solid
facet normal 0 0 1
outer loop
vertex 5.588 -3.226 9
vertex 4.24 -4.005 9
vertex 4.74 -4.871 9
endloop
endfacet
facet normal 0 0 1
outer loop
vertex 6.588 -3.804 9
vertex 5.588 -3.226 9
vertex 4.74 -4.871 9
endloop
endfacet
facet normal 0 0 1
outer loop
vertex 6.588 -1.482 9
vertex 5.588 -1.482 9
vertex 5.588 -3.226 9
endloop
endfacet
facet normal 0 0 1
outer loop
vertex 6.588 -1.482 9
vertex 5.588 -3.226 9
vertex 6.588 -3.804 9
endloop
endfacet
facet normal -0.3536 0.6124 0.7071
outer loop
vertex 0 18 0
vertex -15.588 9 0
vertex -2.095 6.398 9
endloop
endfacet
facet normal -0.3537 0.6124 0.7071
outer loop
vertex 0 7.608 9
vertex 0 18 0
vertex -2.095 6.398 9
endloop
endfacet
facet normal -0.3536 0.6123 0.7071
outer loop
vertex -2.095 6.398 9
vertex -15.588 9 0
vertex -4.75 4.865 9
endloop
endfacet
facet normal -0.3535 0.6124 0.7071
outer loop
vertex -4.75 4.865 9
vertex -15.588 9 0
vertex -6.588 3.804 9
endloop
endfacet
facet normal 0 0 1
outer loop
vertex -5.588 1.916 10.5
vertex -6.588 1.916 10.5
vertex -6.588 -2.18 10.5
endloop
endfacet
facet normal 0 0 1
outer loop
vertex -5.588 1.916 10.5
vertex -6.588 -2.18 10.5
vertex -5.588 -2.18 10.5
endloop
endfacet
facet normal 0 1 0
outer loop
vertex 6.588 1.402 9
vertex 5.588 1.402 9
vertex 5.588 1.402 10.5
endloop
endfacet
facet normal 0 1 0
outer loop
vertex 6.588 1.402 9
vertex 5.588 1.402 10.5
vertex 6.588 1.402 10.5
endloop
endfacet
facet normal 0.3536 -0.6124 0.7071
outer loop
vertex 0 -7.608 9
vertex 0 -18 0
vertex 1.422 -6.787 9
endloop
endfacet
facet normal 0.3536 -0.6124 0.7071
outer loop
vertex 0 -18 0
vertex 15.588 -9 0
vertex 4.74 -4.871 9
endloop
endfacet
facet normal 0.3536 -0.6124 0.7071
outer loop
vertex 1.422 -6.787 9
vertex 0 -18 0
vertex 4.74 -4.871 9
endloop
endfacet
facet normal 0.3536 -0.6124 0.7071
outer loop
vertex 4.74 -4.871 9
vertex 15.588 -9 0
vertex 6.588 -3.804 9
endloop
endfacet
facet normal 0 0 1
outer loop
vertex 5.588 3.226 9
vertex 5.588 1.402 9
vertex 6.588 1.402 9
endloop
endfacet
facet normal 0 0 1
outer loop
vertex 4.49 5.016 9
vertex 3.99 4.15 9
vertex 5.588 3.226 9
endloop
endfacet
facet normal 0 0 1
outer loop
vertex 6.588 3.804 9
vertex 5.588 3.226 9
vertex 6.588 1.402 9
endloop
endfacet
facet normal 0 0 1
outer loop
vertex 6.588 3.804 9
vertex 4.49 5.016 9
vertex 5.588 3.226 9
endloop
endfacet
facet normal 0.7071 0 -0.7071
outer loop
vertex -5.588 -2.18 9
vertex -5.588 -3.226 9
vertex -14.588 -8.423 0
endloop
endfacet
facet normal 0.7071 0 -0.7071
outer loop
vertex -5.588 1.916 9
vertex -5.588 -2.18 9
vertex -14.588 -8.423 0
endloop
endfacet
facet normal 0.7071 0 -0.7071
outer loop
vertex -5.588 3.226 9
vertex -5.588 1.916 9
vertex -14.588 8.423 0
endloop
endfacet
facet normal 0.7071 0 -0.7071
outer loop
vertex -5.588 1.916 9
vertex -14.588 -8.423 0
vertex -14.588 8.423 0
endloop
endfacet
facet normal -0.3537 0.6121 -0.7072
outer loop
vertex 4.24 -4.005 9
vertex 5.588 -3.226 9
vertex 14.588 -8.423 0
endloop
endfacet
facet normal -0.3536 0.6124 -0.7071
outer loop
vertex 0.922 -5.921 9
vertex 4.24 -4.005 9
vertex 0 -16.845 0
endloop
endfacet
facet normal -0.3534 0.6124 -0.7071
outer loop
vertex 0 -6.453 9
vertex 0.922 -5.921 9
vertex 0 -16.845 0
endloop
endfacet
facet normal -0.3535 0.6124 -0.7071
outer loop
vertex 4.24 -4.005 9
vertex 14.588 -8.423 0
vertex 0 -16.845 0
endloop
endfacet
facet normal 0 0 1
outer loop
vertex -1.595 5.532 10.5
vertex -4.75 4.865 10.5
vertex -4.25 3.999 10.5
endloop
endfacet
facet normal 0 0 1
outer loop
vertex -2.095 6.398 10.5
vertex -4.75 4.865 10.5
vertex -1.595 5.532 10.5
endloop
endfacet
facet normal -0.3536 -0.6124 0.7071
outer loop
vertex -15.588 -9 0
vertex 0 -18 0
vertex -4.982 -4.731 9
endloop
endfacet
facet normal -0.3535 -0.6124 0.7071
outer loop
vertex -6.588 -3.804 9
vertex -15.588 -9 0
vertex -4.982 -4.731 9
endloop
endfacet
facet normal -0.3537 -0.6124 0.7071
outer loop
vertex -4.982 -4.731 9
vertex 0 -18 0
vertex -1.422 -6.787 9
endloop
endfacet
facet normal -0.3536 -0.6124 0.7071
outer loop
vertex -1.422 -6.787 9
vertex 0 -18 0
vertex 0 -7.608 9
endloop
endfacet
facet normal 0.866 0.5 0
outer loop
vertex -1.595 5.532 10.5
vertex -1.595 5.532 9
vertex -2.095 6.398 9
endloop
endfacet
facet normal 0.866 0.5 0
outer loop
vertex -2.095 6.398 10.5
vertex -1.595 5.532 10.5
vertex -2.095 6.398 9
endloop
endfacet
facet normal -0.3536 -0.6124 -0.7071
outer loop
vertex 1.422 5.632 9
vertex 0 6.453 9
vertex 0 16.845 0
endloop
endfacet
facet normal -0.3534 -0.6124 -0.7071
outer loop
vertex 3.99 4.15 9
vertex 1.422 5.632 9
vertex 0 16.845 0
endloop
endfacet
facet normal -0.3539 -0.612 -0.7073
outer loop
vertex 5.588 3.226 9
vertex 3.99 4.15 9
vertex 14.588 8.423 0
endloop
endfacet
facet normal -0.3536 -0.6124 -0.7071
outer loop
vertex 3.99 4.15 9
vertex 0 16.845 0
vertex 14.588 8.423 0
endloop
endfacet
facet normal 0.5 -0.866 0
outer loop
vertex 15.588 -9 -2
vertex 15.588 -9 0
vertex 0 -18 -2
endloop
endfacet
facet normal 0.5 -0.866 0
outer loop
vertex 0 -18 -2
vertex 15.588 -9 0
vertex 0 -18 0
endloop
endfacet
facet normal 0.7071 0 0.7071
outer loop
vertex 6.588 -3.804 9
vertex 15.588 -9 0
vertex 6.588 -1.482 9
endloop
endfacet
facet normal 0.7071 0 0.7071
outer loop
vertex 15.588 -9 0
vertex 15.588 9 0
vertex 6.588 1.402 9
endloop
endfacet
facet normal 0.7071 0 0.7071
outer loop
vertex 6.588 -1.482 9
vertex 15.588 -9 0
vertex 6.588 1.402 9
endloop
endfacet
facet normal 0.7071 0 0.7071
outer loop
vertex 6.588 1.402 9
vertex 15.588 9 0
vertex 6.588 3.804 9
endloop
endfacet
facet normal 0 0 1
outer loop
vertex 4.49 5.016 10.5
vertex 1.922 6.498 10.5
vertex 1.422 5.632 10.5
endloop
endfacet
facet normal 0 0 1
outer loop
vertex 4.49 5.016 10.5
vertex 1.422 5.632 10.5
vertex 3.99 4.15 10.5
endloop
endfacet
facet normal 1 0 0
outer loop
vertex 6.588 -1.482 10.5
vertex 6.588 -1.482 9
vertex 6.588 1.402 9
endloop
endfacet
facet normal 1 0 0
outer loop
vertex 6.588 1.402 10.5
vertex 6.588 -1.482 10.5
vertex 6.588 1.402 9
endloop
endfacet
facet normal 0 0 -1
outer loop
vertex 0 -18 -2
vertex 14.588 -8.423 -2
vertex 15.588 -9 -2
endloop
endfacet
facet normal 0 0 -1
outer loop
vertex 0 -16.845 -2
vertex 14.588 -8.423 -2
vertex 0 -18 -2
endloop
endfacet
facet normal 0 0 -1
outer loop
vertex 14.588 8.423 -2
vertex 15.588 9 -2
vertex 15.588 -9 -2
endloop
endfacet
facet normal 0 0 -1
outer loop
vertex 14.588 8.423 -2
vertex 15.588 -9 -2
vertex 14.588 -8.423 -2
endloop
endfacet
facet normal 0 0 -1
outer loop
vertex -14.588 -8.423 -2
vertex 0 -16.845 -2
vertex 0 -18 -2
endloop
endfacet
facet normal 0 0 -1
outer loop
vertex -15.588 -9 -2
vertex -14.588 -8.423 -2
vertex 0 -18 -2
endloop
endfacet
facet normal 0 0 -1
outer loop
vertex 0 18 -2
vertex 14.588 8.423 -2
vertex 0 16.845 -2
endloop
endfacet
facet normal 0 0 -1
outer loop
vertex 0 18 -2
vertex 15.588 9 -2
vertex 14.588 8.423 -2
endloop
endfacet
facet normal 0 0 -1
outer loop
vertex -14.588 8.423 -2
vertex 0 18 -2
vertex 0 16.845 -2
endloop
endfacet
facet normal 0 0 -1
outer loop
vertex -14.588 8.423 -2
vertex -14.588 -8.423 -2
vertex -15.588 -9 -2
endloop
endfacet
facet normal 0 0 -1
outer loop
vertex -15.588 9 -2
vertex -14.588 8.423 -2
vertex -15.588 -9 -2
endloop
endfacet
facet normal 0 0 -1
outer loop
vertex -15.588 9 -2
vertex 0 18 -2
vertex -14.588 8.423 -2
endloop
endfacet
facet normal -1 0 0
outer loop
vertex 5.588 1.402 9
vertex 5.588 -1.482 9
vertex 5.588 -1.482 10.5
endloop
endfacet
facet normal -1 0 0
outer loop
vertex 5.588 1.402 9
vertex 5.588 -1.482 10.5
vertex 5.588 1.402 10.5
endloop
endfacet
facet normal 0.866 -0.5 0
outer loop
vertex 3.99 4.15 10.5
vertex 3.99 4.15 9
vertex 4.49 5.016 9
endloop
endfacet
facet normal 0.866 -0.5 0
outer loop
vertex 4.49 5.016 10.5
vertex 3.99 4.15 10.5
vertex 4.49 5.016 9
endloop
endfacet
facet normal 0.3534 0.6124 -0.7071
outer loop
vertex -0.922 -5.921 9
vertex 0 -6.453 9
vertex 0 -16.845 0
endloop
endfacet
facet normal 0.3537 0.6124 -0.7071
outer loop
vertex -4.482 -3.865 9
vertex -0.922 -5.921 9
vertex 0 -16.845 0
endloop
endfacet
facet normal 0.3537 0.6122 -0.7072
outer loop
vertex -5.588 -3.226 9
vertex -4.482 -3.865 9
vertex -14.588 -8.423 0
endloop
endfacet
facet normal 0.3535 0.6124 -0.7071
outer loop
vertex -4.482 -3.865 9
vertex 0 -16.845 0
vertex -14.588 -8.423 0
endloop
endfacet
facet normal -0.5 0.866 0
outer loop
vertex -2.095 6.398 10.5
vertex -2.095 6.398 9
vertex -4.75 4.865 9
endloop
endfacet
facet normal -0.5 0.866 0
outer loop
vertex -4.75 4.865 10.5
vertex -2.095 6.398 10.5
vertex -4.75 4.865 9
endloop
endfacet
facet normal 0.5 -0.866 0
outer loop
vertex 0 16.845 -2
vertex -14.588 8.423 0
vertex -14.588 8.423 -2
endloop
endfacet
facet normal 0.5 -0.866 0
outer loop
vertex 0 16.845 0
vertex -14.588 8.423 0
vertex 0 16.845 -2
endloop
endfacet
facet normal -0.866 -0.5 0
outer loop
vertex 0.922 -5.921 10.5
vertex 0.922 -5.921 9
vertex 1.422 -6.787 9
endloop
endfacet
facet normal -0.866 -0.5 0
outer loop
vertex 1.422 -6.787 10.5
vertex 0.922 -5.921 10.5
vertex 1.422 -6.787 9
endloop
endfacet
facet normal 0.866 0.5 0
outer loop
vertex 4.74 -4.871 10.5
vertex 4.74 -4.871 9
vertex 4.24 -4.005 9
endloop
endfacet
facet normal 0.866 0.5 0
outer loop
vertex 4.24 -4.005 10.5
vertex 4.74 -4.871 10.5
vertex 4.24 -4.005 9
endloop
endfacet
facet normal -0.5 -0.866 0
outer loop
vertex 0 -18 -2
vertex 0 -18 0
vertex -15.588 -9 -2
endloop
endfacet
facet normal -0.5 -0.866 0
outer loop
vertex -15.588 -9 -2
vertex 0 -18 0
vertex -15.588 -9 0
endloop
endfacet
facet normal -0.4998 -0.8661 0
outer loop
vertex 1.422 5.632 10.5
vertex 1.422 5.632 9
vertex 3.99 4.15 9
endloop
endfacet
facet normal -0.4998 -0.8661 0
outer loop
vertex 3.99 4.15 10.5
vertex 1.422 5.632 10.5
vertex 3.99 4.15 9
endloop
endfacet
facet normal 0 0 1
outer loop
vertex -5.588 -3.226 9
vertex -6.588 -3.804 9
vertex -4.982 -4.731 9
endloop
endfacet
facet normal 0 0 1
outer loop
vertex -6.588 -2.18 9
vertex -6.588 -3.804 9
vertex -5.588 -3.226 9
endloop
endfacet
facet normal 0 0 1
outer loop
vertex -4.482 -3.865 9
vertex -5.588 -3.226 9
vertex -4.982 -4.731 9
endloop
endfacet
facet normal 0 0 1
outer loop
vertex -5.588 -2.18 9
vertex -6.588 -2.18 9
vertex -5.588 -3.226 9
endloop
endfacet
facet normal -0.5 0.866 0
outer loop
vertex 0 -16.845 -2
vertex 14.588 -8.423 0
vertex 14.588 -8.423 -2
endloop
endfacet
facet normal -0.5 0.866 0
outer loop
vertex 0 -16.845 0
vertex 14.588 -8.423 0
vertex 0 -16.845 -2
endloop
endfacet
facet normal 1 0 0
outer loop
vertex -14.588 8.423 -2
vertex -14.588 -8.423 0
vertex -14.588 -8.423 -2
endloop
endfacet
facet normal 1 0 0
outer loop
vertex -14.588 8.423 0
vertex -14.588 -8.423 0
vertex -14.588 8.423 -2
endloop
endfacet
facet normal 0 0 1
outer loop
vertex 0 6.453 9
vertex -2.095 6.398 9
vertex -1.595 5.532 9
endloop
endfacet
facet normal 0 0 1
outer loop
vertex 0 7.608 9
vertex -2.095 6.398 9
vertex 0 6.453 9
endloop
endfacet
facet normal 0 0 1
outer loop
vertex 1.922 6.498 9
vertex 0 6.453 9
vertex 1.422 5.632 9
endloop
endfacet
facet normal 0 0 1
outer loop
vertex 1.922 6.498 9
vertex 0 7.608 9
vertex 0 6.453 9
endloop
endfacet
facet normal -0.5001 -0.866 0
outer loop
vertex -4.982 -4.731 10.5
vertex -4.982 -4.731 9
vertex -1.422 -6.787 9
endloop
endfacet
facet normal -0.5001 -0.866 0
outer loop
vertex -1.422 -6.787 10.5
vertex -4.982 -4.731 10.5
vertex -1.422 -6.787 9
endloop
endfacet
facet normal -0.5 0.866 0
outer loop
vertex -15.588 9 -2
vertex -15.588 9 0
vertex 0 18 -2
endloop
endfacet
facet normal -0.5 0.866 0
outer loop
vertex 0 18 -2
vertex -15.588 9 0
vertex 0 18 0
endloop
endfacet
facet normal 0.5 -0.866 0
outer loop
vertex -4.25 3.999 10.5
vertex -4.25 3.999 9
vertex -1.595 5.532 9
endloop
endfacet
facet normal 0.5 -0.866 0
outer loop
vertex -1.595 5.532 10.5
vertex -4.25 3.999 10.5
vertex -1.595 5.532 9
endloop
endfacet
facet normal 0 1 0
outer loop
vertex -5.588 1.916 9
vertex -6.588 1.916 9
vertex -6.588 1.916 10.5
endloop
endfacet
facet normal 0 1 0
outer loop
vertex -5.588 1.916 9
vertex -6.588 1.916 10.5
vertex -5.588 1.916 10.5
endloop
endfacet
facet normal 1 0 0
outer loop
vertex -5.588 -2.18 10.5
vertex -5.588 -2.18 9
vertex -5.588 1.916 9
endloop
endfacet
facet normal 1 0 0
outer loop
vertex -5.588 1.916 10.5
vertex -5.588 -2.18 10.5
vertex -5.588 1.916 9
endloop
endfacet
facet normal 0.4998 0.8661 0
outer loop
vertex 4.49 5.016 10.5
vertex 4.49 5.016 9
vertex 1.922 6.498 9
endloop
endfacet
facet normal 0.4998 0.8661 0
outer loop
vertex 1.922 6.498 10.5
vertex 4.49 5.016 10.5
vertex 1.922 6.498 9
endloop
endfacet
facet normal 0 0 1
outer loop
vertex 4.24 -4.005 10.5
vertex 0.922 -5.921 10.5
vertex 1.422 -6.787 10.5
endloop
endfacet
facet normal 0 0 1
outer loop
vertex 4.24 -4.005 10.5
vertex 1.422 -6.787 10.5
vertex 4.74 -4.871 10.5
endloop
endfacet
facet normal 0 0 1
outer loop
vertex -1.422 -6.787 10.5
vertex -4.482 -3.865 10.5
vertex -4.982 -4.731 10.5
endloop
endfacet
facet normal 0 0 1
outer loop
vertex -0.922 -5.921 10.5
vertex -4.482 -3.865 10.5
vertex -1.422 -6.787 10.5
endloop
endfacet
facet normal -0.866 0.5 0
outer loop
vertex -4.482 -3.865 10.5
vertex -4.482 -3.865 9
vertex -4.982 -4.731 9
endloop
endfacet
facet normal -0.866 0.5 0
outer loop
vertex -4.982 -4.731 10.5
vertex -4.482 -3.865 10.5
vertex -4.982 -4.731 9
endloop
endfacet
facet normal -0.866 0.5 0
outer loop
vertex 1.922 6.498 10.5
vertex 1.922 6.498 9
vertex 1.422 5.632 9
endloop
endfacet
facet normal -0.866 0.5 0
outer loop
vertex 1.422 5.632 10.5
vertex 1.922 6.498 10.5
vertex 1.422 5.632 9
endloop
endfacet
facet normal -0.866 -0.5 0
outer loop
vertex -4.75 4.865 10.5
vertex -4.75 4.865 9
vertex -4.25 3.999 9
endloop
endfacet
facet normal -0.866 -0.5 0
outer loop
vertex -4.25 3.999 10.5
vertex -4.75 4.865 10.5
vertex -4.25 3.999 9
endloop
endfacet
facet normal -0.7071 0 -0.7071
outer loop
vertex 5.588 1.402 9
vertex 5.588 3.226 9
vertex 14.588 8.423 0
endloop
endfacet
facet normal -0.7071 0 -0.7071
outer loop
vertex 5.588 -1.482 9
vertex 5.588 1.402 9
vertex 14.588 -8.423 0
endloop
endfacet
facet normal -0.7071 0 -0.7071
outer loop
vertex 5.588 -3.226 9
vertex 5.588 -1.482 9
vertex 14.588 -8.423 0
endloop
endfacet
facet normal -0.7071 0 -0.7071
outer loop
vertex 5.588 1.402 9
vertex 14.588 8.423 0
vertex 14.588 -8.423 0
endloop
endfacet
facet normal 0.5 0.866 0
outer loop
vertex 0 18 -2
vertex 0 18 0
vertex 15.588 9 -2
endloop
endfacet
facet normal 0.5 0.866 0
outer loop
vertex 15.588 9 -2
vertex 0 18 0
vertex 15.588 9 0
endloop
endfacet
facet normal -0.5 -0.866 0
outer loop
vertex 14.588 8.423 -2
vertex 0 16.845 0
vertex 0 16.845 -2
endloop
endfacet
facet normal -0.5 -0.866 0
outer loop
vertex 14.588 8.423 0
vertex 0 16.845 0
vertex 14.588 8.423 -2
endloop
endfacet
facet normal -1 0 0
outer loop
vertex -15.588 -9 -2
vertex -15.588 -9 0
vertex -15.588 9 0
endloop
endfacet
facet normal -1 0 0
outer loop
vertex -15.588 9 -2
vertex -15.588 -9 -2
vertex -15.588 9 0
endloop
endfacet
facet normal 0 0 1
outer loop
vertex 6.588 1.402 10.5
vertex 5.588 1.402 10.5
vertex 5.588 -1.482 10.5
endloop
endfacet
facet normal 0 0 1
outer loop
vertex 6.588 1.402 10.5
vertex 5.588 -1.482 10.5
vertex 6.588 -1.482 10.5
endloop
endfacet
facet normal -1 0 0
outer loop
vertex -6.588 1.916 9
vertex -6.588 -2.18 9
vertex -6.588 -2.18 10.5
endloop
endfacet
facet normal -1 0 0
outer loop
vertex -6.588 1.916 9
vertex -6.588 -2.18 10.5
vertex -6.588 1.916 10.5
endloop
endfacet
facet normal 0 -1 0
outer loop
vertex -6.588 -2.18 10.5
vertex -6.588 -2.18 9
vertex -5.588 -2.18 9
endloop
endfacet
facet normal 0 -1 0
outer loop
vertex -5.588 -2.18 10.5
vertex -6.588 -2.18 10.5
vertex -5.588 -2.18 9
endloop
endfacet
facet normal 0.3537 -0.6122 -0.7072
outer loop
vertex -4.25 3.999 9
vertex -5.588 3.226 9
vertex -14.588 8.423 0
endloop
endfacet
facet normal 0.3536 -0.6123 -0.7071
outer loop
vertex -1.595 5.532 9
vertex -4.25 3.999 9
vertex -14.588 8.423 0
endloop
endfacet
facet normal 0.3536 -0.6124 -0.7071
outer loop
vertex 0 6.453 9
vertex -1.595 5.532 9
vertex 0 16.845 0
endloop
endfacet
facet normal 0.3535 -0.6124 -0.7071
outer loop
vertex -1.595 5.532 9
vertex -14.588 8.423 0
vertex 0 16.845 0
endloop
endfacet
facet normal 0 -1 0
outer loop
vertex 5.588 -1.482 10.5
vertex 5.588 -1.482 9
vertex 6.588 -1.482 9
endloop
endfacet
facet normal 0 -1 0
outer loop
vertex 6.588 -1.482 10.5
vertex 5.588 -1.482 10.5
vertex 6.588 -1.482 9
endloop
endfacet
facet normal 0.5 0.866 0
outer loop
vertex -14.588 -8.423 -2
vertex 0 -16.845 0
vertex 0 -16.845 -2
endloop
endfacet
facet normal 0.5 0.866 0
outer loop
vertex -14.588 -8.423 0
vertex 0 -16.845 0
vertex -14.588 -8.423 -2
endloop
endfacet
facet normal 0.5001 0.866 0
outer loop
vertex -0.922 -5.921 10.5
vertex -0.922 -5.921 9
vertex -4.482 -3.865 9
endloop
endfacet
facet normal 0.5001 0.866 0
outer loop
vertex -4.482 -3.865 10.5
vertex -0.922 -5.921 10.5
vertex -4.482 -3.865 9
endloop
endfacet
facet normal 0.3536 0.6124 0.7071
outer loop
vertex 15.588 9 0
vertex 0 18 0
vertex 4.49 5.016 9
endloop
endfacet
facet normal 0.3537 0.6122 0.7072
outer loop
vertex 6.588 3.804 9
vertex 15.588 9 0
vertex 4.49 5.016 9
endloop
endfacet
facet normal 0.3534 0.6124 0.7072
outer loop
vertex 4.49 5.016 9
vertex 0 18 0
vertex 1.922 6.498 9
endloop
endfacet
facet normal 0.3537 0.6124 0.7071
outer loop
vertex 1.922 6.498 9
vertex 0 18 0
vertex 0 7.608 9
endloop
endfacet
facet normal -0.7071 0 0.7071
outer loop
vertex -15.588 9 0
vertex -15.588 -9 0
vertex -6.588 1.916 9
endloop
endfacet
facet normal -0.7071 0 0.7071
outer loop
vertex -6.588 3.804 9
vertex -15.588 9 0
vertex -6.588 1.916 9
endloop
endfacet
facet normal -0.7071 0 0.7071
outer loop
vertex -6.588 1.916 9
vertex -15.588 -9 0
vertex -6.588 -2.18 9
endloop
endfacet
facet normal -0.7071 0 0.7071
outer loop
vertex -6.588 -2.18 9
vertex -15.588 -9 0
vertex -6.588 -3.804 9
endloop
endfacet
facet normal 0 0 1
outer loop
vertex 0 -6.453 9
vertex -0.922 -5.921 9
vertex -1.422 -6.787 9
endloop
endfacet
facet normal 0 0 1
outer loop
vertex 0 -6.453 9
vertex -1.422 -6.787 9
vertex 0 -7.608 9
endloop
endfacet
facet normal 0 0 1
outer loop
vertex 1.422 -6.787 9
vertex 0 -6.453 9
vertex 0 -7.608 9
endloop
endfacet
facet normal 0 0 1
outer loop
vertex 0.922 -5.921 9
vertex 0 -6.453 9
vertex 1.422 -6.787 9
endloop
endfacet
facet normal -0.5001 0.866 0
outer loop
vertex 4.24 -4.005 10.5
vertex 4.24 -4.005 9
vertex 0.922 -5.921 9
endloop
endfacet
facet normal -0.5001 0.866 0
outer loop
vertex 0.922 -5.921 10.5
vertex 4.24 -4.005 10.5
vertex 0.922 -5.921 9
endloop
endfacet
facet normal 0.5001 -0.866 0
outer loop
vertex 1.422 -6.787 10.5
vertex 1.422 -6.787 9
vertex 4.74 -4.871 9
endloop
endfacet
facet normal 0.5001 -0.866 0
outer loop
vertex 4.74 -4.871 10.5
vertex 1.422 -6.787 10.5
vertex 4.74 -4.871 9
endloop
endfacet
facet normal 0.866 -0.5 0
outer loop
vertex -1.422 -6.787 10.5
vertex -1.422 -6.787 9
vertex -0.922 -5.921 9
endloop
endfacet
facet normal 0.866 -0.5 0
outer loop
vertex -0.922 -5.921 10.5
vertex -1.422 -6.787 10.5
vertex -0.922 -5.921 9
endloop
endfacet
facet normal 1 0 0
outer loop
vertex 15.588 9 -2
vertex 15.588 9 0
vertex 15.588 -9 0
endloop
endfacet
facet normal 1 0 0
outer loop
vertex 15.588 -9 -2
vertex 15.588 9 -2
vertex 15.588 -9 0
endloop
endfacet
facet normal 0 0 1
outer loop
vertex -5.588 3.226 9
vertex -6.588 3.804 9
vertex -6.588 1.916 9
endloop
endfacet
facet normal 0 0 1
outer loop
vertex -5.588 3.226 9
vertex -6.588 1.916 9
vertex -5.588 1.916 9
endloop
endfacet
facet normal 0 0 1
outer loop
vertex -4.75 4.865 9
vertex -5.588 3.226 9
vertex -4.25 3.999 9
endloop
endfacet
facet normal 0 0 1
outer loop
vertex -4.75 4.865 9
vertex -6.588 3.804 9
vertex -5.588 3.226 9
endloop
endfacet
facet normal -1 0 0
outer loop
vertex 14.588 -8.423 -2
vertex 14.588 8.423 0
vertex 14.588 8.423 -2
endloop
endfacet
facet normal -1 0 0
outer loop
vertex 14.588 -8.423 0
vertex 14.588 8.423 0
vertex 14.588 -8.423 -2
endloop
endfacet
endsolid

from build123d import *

# Parameters (mm, degrees)
AUFSATZ_LINEAR_AUSTRAGEN1_DEPTH = 10
AUFSATZ_LINEAR_AUSTRAGEN1_TAPER = 45
SCHNITT_LINEAR_AUSTRAGEN1_DEPTH = 10
SCHNITT_LINEAR_AUSTRAGEN1_DRAFT = -45
SKIZZE4_W                       = 18.456831932
SKIZZE4_H                       = 18.61324181
SCHNITT_LINEAR_AUSTRAGEN2_DEPTH = 1
LINEAR_AUSTRAGEN_D_NN1_DEPTH    = 2
SKIZZE6_W                       = 1
SKIZZE6_H                       = 2.884303542
SKIZZE6_H_2                     = 4.096110591
AUFSATZ_LINEAR_AUSTRAGEN2_DEPTH = 1.5


with BuildPart() as part:
    # Skizze1 → Aufsatz-Linear austragen1 (new body)
    with BuildSketch(Plane.XY):
        Polygon((0, 18), (-15.588457268, 9), (-15.588457268, -9), (0, -18), (15.588457268, -9), (15.588457268, 9), align=None)
    extrude(amount=AUFSATZ_LINEAR_AUSTRAGEN1_DEPTH, taper=AUFSATZ_LINEAR_AUSTRAGEN1_TAPER)


with BuildPart() as schnitt_linear_austragen1_tool:
    # Skizze3 → Schnitt-Linear austragen1 (with draft: the straight prism first)
    with BuildSketch(Plane(origin=(0, 0, 0), x_dir=(-1, 0, 0), z_dir=(0, 0, -1))):
        Polygon((0, -16.845299462), (14.588457268, -8.422649731), (14.588457268, 8.422649731), (0, 16.845299462), (-14.588457268, 8.422649731), (-14.588457268, -8.422649731), align=None)
    extrude(amount=-SCHNITT_LINEAR_AUSTRAGEN1_DEPTH)
    # Schnitt-Linear austragen1: the draft: its side faces are tilted about the plane it starts from
    schnitt_linear_austragen1_sides = [schnitt_linear_austragen1_tool.faces().sort_by_distance(p)[0] for p in [
        (-7.294228634, -12.633974596, 5),
        (-14.588457268, 0, 5),
        (-7.294228634, 12.633974596, 5),
        (7.294228634, 12.633974596, 5),
        (14.588457268, 0, 5),
        (7.294228634, -12.633974596, 5),
    ]]
    draft(schnitt_linear_austragen1_sides, Plane(origin=(0, 0, 0), x_dir=(-1, 0, 0), z_dir=(0, 0, -1)), SCHNITT_LINEAR_AUSTRAGEN1_DRAFT)


with BuildPart() as part_1:
    add(part.part)

    # Schnitt-Linear austragen1: cut by schnitt_linear_austragen1_tool
    add(schnitt_linear_austragen1_tool.part, mode=Mode.SUBTRACT)

    # Skizze4 → Schnitt-Linear austragen2 (cut)
    with BuildSketch(Plane.XY.offset(10)):
        with Locations((-0.579719129, -0.066676412)):
            Rectangle(SKIZZE4_W, SKIZZE4_H)
    extrude(amount=-SCHNITT_LINEAR_AUSTRAGEN2_DEPTH, mode=Mode.SUBTRACT)

    # Skizze5 → Linear-Austragen-Dünn1 (add)
    with BuildSketch(Plane(origin=(0, 0, 0), x_dir=(-1, 0, 0), z_dir=(0, 0, -1))):
        Polygon((0, 18), (-15.588457268, 9), (-15.588457268, -9), (0, -18), (15.588457268, -9), (15.588457268, 9), align=None)
        Polygon((0, 16.845299462), (-14.588457268, 8.422649731), (-14.588457268, -8.422649731), (0, -16.845299462), (14.588457268, -8.422649731), (14.588457268, 8.422649731), align=None, mode=Mode.SUBTRACT)
    extrude(amount=LINEAR_AUSTRAGEN_D_NN1_DEPTH)

    # Skizze6 → Aufsatz-Linear austragen2 (add)
    with BuildSketch(Plane.XY.offset(9)):
        Polygon((-4.749990863, 4.865286651), (-4.249990863, 3.999261247), (-1.59539386, 5.531893541), (-2.09539386, 6.397918945), align=None)
        Polygon((1.921657415, 6.498225729), (1.421657415, 5.632200325), (3.989719656, 4.149528899), (4.489719656, 5.015554303), align=None)
        with Locations((6.088457268, -0.039837206)):
            Rectangle(SKIZZE6_W, SKIZZE6_H)
        Polygon((4.739719656, -4.871216735), (4.239719656, -4.005191332), (0.921657415, -5.92087546), (1.421657415, -6.786900863), align=None)
        Polygon((-1.421657415, -6.786900863), (-0.921657415, -5.92087546), (-4.48199319, -3.865314642), (-4.98199319, -4.731340045), align=None)
        with Locations((-6.088457268, -0.132397801)):
            Rectangle(SKIZZE6_W, SKIZZE6_H_2)
    extrude(amount=AUFSATZ_LINEAR_AUSTRAGEN2_DEPTH)


solid = part_1.part
